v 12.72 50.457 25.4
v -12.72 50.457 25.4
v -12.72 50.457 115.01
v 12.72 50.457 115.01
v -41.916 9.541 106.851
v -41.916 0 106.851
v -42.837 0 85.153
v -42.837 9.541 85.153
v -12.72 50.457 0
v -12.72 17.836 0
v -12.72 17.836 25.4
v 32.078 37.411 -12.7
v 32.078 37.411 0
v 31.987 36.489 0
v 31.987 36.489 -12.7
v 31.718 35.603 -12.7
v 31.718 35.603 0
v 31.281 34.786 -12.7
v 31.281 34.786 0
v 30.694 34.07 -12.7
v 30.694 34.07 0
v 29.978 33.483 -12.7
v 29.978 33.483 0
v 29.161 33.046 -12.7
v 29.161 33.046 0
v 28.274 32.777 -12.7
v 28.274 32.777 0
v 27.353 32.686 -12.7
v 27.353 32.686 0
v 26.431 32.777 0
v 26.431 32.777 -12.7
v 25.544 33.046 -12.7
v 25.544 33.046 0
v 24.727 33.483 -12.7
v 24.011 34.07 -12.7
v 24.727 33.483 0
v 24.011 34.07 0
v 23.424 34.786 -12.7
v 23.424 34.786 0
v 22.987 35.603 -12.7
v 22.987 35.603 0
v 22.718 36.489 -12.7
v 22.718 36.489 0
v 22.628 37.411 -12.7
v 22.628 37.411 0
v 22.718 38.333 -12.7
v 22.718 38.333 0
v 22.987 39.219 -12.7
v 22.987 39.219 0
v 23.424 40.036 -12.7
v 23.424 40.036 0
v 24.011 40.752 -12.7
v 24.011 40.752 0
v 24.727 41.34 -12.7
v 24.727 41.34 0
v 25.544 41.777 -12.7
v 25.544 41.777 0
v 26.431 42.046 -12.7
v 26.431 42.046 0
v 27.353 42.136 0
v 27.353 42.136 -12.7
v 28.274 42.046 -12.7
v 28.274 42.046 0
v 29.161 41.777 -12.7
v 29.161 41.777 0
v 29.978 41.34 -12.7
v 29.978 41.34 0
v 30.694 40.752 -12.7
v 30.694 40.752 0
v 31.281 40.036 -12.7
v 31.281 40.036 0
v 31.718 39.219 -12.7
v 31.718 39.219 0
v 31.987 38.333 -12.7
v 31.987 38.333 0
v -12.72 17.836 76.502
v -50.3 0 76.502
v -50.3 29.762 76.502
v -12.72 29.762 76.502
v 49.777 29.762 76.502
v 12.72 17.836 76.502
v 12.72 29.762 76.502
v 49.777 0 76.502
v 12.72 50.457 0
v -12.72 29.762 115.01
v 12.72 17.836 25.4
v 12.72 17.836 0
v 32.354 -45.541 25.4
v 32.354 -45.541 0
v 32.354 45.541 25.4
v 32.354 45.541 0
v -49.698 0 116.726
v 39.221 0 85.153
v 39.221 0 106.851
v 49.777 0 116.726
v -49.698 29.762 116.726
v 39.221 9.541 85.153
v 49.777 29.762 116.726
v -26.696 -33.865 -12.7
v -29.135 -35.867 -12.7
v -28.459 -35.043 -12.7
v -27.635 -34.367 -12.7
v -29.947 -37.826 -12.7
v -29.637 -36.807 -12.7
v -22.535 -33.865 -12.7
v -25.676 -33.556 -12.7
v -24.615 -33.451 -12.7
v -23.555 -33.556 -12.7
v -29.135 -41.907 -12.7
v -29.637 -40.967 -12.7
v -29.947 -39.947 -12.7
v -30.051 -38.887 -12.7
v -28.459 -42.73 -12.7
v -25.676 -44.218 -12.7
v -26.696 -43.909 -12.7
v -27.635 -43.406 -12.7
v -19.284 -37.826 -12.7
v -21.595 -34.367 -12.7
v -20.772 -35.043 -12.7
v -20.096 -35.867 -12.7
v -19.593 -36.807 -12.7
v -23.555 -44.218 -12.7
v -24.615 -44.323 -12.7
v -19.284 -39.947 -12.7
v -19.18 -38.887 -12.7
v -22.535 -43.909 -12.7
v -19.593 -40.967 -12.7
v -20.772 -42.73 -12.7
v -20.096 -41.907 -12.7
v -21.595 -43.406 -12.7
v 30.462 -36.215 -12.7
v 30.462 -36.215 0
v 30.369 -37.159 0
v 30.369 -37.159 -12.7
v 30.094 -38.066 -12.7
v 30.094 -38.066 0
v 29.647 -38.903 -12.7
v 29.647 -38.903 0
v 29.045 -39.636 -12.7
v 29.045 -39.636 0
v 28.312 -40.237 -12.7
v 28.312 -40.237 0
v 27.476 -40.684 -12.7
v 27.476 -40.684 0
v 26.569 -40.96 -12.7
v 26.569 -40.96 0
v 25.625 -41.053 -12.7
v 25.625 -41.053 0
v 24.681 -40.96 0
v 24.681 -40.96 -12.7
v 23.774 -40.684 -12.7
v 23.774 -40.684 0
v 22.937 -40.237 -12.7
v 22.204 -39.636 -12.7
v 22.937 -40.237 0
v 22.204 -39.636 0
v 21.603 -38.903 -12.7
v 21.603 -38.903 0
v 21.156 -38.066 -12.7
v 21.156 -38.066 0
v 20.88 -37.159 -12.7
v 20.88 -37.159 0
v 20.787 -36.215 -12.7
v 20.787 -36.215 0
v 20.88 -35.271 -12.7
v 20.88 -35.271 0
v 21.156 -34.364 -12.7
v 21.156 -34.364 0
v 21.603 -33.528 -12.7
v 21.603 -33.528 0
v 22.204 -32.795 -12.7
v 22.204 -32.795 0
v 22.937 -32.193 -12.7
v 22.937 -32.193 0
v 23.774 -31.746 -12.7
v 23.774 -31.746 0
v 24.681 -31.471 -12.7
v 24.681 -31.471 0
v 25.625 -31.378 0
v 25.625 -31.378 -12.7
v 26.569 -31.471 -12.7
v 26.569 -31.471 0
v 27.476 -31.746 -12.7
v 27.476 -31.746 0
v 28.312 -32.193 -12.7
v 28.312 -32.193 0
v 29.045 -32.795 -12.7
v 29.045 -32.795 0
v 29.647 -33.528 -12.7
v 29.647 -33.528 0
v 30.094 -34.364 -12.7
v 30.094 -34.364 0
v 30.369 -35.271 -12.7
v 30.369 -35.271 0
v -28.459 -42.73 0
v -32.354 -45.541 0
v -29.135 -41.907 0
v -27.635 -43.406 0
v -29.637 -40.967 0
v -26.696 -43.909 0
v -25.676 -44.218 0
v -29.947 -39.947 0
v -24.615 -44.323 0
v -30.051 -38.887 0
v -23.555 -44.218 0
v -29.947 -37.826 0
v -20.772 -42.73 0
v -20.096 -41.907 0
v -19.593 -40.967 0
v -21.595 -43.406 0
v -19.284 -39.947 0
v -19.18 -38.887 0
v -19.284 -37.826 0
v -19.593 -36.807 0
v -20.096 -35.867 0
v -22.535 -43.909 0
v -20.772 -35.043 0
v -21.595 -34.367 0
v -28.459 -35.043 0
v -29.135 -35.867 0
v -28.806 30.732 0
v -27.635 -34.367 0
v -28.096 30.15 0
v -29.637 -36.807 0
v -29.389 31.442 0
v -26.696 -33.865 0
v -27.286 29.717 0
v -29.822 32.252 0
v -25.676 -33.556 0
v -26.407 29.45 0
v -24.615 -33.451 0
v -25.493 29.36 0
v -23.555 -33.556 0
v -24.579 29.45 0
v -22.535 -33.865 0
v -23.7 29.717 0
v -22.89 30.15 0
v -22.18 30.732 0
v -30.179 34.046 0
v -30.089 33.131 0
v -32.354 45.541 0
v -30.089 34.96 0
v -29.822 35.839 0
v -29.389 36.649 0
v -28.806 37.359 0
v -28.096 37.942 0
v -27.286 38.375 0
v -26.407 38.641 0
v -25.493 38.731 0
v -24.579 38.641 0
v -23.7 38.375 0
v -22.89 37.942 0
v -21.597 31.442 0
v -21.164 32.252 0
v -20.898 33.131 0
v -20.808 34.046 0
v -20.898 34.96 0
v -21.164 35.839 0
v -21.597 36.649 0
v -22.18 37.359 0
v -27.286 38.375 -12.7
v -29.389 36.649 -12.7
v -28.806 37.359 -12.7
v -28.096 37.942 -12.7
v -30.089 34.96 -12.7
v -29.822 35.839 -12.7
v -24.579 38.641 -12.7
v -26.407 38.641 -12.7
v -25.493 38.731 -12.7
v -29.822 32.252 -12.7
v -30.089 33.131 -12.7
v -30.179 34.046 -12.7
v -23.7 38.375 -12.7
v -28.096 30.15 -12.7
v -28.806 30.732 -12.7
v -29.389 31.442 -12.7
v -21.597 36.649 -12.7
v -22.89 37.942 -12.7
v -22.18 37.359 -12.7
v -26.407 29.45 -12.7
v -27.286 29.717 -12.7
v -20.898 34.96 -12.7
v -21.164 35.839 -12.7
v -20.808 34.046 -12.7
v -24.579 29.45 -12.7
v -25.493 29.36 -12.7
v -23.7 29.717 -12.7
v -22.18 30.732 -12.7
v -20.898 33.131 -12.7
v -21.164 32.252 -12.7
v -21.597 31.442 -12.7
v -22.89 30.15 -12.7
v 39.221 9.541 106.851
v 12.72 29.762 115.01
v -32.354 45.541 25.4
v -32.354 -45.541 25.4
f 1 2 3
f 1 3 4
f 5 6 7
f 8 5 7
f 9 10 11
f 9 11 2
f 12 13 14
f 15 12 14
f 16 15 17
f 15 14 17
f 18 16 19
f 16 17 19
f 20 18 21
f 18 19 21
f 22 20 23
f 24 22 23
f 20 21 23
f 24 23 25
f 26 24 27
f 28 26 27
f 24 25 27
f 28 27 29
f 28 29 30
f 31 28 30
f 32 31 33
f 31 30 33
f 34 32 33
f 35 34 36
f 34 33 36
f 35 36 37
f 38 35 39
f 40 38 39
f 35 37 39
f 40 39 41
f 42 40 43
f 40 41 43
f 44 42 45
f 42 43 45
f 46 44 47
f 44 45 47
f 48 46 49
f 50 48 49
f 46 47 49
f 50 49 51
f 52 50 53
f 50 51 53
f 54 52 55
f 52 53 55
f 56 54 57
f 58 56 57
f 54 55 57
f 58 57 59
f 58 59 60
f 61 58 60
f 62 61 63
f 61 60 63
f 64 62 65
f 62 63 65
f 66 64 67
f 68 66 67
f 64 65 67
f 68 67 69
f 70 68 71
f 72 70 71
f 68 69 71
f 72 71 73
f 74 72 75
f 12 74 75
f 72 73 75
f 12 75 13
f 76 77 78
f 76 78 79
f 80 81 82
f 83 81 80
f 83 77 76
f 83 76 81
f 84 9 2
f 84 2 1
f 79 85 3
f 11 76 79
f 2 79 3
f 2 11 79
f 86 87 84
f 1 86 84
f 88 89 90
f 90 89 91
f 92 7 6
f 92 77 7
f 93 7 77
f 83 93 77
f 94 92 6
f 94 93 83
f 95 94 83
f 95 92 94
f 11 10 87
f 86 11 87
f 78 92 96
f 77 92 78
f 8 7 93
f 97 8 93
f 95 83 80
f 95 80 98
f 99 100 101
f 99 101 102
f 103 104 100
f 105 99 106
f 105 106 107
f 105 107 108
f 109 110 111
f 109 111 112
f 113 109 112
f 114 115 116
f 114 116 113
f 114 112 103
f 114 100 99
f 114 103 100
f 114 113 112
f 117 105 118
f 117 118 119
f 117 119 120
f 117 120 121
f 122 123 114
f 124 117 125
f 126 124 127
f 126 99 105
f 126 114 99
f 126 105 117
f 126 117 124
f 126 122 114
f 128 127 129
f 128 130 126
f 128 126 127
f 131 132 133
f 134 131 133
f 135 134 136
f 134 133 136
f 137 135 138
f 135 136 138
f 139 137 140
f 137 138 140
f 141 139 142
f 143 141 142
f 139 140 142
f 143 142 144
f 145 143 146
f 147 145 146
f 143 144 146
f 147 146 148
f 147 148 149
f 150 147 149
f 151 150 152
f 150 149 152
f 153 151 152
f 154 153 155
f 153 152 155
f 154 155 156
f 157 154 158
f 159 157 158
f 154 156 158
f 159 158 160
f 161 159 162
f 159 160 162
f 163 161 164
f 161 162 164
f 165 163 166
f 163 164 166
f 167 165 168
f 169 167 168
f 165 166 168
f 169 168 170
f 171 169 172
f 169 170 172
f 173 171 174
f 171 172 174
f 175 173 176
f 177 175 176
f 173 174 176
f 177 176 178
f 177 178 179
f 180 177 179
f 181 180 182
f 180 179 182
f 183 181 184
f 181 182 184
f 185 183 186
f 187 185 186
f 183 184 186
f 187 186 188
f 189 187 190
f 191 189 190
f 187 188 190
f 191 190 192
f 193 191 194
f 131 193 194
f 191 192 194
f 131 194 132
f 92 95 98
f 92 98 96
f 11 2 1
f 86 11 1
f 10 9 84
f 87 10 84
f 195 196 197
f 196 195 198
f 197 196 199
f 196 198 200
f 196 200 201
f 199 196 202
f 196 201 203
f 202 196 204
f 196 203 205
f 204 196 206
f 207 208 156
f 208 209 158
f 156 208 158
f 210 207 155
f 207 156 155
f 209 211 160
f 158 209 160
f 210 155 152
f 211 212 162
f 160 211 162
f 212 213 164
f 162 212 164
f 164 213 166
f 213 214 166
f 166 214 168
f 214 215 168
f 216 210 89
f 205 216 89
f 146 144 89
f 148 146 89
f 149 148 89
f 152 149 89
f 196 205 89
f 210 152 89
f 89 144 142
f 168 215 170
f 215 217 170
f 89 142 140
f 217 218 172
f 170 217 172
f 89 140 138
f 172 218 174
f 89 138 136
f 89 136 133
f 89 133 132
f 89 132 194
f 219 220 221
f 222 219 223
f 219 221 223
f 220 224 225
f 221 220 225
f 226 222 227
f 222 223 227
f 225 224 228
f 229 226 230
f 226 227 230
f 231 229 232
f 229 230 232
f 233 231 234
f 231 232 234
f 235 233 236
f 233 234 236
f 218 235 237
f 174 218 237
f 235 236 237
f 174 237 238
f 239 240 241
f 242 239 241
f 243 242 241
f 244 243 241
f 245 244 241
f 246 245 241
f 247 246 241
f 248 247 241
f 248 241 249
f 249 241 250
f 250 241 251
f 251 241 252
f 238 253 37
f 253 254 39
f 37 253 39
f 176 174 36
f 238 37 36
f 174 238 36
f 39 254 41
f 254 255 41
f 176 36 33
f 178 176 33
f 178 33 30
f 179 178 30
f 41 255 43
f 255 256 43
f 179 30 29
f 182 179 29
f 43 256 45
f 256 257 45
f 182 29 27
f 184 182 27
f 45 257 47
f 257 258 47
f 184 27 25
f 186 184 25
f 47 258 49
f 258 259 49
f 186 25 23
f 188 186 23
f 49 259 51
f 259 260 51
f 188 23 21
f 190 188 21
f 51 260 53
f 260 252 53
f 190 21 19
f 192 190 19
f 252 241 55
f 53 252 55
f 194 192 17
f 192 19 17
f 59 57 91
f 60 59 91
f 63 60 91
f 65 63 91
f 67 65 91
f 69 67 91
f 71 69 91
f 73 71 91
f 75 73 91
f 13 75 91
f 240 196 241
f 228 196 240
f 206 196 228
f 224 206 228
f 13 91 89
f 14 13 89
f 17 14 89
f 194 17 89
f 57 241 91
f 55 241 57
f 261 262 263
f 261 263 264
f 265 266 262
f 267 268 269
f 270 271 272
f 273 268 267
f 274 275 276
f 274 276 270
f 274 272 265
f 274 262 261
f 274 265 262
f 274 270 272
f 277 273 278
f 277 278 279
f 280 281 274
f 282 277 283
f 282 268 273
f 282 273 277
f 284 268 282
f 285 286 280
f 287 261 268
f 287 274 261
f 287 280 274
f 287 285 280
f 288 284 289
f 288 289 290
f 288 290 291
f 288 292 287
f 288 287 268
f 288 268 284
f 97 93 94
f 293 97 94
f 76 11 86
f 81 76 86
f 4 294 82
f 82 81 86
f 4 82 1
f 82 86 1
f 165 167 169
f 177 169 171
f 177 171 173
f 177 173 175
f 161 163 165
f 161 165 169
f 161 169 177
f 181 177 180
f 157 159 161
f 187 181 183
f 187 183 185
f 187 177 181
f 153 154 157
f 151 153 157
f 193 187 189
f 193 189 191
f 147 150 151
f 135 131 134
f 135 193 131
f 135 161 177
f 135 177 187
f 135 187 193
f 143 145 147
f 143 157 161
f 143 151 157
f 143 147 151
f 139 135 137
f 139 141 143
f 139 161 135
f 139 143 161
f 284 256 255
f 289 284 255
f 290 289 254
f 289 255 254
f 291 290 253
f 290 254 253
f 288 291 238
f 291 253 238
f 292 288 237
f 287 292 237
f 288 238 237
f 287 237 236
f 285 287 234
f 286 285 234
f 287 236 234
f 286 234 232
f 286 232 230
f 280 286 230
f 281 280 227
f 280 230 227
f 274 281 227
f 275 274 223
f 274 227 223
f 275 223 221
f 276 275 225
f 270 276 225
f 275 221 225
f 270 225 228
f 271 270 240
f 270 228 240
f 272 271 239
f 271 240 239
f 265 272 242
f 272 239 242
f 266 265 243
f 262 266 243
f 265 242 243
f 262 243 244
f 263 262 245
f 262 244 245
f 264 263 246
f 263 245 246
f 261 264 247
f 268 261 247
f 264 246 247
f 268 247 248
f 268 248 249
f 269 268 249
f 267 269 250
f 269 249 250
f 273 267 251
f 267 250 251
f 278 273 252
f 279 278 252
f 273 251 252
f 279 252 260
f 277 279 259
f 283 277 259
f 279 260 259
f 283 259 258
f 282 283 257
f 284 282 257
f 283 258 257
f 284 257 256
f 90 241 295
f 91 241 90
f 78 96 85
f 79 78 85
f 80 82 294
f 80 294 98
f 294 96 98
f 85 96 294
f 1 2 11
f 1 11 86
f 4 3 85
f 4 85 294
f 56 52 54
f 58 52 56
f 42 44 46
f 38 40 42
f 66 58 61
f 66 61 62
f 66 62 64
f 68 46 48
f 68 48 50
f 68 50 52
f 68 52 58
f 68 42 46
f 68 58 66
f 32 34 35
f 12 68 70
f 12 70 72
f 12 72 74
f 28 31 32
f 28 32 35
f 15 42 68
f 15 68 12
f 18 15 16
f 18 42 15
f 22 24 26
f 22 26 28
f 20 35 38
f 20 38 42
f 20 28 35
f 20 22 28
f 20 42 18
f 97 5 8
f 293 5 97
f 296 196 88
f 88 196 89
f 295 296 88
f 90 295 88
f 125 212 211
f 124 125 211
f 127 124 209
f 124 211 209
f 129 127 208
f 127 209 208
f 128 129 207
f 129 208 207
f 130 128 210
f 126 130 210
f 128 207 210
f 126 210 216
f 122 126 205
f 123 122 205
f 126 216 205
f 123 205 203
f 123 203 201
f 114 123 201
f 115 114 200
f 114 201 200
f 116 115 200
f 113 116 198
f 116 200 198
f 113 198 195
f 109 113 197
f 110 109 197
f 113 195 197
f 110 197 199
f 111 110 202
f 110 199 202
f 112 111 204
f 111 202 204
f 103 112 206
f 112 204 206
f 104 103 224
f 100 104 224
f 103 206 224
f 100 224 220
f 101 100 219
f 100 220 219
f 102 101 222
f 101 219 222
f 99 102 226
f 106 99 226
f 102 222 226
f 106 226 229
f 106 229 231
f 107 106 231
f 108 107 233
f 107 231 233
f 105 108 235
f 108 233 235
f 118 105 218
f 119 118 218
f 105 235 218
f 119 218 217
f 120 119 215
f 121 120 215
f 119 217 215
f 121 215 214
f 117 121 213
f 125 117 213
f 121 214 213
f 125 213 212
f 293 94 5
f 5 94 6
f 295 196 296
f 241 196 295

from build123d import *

# Parameters (mm, degrees)
F0_W      = 64.7089081536
F0_H      = 91.0820662975
F2_DEPTH  = 25.4
F1_W      = 25.4400372505
F1_H      = 58.02115798
F3_DEPTH  = 89.6096453071
F5_R      = 4.7250280685
F5_R_2    = 4.8375032474
F5_R_3    = 4.6856287228
F5_R_4    = 5.4357008366
F6_DEPTH  = 12.7
F8_DEPTH  = 29.7622364014
F9_DEPTH  = 25.4
F10_DEPTH = 25.4
F12_DEPTH = 25.4
F13_DEPTH = 34.9412560463


with BuildPart() as f2:
    # F0 (on Top) → F2 (new body)
    with BuildSketch(Plane.XY):
        Rectangle(F0_W, F0_H)
    extrude(amount=F2_DEPTH)

    # F5 (on face) → F6 (join)
    with BuildSketch(Plane(origin=(0, 0, 0), x_dir=(1, 0, 0), z_dir=(0, 0, -1))):
        with Locations((27.3525565863, -37.4112650752)):
            Circle(F5_R)
        with Locations((25.6248470396, 36.2151861191)):
            Circle(F5_R_2)
        with Locations((-25.4932455719, -34.0455546975)):
            Circle(F5_R_3)
        with Locations((-24.6153641492, 38.8868637383)):
            Circle(F5_R_4)
    extrude(amount=F6_DEPTH)


with BuildPart() as f2b:
    # F1 (on Top) → F2, piece 2 (new body)
    with BuildSketch(Plane.XY):
        with Locations((0, 46.8465387821)):
            Rectangle(F1_W, F1_H)
    extrude(amount=F2_DEPTH)


with BuildPart() as f3:
    # F3 (new): a face of the model
    f3_faces = [f2b.part.faces().sort_by_distance(p)[0] for p in [
        (0, 46.8465387821, 25.4),
    ]]
    extrude(f3_faces, amount=F3_DEPTH)

    # F7 (on Front) → F8 (join)
    with BuildSketch(Plane.XZ):
        Polygon((49.7772246599, 116.7258173227), (-49.6982187033, 116.7258173227), (-50.3003709018, 76.5020921826), (49.7772246599, 76.5020921826), align=None)
    extrude(amount=-F8_DEPTH)

    # F9 (cut): a face of the model
    f9_faces = [f3.faces().sort_by_distance(p)[0] for p in [
        (0, 75.8571177721, 70.2048226535),
    ]]
    extrude(f9_faces, amount=-F9_DEPTH, mode=Mode.SUBTRACT)

    # F11 (on face) → F12 (join)
    with BuildSketch(Plane.XZ):
        Polygon((39.2207503319, 106.8511903286), (-41.9160611928, 106.8511903286), (-42.8365767002, 85.1533412933), (39.2207503319, 85.1533412933), align=None)
    extrude(amount=F12_DEPTH)

    # F13 (cut): a face of the model
    f13_faces = [f3.faces().sort_by_distance(p)[0] for p in [
        (-1.5782169969, -25.4, 95.9818676044),
    ]]
    extrude(f13_faces, amount=-F13_DEPTH, mode=Mode.SUBTRACT)


with BuildPart() as f2b_1:
    add(f2b.part)

    # F10 (cut): a face of the model
    f10_faces = [f2b_1.faces().sort_by_distance(p)[0] for p in [
        (0, 75.8571177721, 12.7),
    ]]
    extrude(f10_faces, amount=-F10_DEPTH, mode=Mode.SUBTRACT)


solid = Compound([f2.part, f3.part, f2b_1.part])
